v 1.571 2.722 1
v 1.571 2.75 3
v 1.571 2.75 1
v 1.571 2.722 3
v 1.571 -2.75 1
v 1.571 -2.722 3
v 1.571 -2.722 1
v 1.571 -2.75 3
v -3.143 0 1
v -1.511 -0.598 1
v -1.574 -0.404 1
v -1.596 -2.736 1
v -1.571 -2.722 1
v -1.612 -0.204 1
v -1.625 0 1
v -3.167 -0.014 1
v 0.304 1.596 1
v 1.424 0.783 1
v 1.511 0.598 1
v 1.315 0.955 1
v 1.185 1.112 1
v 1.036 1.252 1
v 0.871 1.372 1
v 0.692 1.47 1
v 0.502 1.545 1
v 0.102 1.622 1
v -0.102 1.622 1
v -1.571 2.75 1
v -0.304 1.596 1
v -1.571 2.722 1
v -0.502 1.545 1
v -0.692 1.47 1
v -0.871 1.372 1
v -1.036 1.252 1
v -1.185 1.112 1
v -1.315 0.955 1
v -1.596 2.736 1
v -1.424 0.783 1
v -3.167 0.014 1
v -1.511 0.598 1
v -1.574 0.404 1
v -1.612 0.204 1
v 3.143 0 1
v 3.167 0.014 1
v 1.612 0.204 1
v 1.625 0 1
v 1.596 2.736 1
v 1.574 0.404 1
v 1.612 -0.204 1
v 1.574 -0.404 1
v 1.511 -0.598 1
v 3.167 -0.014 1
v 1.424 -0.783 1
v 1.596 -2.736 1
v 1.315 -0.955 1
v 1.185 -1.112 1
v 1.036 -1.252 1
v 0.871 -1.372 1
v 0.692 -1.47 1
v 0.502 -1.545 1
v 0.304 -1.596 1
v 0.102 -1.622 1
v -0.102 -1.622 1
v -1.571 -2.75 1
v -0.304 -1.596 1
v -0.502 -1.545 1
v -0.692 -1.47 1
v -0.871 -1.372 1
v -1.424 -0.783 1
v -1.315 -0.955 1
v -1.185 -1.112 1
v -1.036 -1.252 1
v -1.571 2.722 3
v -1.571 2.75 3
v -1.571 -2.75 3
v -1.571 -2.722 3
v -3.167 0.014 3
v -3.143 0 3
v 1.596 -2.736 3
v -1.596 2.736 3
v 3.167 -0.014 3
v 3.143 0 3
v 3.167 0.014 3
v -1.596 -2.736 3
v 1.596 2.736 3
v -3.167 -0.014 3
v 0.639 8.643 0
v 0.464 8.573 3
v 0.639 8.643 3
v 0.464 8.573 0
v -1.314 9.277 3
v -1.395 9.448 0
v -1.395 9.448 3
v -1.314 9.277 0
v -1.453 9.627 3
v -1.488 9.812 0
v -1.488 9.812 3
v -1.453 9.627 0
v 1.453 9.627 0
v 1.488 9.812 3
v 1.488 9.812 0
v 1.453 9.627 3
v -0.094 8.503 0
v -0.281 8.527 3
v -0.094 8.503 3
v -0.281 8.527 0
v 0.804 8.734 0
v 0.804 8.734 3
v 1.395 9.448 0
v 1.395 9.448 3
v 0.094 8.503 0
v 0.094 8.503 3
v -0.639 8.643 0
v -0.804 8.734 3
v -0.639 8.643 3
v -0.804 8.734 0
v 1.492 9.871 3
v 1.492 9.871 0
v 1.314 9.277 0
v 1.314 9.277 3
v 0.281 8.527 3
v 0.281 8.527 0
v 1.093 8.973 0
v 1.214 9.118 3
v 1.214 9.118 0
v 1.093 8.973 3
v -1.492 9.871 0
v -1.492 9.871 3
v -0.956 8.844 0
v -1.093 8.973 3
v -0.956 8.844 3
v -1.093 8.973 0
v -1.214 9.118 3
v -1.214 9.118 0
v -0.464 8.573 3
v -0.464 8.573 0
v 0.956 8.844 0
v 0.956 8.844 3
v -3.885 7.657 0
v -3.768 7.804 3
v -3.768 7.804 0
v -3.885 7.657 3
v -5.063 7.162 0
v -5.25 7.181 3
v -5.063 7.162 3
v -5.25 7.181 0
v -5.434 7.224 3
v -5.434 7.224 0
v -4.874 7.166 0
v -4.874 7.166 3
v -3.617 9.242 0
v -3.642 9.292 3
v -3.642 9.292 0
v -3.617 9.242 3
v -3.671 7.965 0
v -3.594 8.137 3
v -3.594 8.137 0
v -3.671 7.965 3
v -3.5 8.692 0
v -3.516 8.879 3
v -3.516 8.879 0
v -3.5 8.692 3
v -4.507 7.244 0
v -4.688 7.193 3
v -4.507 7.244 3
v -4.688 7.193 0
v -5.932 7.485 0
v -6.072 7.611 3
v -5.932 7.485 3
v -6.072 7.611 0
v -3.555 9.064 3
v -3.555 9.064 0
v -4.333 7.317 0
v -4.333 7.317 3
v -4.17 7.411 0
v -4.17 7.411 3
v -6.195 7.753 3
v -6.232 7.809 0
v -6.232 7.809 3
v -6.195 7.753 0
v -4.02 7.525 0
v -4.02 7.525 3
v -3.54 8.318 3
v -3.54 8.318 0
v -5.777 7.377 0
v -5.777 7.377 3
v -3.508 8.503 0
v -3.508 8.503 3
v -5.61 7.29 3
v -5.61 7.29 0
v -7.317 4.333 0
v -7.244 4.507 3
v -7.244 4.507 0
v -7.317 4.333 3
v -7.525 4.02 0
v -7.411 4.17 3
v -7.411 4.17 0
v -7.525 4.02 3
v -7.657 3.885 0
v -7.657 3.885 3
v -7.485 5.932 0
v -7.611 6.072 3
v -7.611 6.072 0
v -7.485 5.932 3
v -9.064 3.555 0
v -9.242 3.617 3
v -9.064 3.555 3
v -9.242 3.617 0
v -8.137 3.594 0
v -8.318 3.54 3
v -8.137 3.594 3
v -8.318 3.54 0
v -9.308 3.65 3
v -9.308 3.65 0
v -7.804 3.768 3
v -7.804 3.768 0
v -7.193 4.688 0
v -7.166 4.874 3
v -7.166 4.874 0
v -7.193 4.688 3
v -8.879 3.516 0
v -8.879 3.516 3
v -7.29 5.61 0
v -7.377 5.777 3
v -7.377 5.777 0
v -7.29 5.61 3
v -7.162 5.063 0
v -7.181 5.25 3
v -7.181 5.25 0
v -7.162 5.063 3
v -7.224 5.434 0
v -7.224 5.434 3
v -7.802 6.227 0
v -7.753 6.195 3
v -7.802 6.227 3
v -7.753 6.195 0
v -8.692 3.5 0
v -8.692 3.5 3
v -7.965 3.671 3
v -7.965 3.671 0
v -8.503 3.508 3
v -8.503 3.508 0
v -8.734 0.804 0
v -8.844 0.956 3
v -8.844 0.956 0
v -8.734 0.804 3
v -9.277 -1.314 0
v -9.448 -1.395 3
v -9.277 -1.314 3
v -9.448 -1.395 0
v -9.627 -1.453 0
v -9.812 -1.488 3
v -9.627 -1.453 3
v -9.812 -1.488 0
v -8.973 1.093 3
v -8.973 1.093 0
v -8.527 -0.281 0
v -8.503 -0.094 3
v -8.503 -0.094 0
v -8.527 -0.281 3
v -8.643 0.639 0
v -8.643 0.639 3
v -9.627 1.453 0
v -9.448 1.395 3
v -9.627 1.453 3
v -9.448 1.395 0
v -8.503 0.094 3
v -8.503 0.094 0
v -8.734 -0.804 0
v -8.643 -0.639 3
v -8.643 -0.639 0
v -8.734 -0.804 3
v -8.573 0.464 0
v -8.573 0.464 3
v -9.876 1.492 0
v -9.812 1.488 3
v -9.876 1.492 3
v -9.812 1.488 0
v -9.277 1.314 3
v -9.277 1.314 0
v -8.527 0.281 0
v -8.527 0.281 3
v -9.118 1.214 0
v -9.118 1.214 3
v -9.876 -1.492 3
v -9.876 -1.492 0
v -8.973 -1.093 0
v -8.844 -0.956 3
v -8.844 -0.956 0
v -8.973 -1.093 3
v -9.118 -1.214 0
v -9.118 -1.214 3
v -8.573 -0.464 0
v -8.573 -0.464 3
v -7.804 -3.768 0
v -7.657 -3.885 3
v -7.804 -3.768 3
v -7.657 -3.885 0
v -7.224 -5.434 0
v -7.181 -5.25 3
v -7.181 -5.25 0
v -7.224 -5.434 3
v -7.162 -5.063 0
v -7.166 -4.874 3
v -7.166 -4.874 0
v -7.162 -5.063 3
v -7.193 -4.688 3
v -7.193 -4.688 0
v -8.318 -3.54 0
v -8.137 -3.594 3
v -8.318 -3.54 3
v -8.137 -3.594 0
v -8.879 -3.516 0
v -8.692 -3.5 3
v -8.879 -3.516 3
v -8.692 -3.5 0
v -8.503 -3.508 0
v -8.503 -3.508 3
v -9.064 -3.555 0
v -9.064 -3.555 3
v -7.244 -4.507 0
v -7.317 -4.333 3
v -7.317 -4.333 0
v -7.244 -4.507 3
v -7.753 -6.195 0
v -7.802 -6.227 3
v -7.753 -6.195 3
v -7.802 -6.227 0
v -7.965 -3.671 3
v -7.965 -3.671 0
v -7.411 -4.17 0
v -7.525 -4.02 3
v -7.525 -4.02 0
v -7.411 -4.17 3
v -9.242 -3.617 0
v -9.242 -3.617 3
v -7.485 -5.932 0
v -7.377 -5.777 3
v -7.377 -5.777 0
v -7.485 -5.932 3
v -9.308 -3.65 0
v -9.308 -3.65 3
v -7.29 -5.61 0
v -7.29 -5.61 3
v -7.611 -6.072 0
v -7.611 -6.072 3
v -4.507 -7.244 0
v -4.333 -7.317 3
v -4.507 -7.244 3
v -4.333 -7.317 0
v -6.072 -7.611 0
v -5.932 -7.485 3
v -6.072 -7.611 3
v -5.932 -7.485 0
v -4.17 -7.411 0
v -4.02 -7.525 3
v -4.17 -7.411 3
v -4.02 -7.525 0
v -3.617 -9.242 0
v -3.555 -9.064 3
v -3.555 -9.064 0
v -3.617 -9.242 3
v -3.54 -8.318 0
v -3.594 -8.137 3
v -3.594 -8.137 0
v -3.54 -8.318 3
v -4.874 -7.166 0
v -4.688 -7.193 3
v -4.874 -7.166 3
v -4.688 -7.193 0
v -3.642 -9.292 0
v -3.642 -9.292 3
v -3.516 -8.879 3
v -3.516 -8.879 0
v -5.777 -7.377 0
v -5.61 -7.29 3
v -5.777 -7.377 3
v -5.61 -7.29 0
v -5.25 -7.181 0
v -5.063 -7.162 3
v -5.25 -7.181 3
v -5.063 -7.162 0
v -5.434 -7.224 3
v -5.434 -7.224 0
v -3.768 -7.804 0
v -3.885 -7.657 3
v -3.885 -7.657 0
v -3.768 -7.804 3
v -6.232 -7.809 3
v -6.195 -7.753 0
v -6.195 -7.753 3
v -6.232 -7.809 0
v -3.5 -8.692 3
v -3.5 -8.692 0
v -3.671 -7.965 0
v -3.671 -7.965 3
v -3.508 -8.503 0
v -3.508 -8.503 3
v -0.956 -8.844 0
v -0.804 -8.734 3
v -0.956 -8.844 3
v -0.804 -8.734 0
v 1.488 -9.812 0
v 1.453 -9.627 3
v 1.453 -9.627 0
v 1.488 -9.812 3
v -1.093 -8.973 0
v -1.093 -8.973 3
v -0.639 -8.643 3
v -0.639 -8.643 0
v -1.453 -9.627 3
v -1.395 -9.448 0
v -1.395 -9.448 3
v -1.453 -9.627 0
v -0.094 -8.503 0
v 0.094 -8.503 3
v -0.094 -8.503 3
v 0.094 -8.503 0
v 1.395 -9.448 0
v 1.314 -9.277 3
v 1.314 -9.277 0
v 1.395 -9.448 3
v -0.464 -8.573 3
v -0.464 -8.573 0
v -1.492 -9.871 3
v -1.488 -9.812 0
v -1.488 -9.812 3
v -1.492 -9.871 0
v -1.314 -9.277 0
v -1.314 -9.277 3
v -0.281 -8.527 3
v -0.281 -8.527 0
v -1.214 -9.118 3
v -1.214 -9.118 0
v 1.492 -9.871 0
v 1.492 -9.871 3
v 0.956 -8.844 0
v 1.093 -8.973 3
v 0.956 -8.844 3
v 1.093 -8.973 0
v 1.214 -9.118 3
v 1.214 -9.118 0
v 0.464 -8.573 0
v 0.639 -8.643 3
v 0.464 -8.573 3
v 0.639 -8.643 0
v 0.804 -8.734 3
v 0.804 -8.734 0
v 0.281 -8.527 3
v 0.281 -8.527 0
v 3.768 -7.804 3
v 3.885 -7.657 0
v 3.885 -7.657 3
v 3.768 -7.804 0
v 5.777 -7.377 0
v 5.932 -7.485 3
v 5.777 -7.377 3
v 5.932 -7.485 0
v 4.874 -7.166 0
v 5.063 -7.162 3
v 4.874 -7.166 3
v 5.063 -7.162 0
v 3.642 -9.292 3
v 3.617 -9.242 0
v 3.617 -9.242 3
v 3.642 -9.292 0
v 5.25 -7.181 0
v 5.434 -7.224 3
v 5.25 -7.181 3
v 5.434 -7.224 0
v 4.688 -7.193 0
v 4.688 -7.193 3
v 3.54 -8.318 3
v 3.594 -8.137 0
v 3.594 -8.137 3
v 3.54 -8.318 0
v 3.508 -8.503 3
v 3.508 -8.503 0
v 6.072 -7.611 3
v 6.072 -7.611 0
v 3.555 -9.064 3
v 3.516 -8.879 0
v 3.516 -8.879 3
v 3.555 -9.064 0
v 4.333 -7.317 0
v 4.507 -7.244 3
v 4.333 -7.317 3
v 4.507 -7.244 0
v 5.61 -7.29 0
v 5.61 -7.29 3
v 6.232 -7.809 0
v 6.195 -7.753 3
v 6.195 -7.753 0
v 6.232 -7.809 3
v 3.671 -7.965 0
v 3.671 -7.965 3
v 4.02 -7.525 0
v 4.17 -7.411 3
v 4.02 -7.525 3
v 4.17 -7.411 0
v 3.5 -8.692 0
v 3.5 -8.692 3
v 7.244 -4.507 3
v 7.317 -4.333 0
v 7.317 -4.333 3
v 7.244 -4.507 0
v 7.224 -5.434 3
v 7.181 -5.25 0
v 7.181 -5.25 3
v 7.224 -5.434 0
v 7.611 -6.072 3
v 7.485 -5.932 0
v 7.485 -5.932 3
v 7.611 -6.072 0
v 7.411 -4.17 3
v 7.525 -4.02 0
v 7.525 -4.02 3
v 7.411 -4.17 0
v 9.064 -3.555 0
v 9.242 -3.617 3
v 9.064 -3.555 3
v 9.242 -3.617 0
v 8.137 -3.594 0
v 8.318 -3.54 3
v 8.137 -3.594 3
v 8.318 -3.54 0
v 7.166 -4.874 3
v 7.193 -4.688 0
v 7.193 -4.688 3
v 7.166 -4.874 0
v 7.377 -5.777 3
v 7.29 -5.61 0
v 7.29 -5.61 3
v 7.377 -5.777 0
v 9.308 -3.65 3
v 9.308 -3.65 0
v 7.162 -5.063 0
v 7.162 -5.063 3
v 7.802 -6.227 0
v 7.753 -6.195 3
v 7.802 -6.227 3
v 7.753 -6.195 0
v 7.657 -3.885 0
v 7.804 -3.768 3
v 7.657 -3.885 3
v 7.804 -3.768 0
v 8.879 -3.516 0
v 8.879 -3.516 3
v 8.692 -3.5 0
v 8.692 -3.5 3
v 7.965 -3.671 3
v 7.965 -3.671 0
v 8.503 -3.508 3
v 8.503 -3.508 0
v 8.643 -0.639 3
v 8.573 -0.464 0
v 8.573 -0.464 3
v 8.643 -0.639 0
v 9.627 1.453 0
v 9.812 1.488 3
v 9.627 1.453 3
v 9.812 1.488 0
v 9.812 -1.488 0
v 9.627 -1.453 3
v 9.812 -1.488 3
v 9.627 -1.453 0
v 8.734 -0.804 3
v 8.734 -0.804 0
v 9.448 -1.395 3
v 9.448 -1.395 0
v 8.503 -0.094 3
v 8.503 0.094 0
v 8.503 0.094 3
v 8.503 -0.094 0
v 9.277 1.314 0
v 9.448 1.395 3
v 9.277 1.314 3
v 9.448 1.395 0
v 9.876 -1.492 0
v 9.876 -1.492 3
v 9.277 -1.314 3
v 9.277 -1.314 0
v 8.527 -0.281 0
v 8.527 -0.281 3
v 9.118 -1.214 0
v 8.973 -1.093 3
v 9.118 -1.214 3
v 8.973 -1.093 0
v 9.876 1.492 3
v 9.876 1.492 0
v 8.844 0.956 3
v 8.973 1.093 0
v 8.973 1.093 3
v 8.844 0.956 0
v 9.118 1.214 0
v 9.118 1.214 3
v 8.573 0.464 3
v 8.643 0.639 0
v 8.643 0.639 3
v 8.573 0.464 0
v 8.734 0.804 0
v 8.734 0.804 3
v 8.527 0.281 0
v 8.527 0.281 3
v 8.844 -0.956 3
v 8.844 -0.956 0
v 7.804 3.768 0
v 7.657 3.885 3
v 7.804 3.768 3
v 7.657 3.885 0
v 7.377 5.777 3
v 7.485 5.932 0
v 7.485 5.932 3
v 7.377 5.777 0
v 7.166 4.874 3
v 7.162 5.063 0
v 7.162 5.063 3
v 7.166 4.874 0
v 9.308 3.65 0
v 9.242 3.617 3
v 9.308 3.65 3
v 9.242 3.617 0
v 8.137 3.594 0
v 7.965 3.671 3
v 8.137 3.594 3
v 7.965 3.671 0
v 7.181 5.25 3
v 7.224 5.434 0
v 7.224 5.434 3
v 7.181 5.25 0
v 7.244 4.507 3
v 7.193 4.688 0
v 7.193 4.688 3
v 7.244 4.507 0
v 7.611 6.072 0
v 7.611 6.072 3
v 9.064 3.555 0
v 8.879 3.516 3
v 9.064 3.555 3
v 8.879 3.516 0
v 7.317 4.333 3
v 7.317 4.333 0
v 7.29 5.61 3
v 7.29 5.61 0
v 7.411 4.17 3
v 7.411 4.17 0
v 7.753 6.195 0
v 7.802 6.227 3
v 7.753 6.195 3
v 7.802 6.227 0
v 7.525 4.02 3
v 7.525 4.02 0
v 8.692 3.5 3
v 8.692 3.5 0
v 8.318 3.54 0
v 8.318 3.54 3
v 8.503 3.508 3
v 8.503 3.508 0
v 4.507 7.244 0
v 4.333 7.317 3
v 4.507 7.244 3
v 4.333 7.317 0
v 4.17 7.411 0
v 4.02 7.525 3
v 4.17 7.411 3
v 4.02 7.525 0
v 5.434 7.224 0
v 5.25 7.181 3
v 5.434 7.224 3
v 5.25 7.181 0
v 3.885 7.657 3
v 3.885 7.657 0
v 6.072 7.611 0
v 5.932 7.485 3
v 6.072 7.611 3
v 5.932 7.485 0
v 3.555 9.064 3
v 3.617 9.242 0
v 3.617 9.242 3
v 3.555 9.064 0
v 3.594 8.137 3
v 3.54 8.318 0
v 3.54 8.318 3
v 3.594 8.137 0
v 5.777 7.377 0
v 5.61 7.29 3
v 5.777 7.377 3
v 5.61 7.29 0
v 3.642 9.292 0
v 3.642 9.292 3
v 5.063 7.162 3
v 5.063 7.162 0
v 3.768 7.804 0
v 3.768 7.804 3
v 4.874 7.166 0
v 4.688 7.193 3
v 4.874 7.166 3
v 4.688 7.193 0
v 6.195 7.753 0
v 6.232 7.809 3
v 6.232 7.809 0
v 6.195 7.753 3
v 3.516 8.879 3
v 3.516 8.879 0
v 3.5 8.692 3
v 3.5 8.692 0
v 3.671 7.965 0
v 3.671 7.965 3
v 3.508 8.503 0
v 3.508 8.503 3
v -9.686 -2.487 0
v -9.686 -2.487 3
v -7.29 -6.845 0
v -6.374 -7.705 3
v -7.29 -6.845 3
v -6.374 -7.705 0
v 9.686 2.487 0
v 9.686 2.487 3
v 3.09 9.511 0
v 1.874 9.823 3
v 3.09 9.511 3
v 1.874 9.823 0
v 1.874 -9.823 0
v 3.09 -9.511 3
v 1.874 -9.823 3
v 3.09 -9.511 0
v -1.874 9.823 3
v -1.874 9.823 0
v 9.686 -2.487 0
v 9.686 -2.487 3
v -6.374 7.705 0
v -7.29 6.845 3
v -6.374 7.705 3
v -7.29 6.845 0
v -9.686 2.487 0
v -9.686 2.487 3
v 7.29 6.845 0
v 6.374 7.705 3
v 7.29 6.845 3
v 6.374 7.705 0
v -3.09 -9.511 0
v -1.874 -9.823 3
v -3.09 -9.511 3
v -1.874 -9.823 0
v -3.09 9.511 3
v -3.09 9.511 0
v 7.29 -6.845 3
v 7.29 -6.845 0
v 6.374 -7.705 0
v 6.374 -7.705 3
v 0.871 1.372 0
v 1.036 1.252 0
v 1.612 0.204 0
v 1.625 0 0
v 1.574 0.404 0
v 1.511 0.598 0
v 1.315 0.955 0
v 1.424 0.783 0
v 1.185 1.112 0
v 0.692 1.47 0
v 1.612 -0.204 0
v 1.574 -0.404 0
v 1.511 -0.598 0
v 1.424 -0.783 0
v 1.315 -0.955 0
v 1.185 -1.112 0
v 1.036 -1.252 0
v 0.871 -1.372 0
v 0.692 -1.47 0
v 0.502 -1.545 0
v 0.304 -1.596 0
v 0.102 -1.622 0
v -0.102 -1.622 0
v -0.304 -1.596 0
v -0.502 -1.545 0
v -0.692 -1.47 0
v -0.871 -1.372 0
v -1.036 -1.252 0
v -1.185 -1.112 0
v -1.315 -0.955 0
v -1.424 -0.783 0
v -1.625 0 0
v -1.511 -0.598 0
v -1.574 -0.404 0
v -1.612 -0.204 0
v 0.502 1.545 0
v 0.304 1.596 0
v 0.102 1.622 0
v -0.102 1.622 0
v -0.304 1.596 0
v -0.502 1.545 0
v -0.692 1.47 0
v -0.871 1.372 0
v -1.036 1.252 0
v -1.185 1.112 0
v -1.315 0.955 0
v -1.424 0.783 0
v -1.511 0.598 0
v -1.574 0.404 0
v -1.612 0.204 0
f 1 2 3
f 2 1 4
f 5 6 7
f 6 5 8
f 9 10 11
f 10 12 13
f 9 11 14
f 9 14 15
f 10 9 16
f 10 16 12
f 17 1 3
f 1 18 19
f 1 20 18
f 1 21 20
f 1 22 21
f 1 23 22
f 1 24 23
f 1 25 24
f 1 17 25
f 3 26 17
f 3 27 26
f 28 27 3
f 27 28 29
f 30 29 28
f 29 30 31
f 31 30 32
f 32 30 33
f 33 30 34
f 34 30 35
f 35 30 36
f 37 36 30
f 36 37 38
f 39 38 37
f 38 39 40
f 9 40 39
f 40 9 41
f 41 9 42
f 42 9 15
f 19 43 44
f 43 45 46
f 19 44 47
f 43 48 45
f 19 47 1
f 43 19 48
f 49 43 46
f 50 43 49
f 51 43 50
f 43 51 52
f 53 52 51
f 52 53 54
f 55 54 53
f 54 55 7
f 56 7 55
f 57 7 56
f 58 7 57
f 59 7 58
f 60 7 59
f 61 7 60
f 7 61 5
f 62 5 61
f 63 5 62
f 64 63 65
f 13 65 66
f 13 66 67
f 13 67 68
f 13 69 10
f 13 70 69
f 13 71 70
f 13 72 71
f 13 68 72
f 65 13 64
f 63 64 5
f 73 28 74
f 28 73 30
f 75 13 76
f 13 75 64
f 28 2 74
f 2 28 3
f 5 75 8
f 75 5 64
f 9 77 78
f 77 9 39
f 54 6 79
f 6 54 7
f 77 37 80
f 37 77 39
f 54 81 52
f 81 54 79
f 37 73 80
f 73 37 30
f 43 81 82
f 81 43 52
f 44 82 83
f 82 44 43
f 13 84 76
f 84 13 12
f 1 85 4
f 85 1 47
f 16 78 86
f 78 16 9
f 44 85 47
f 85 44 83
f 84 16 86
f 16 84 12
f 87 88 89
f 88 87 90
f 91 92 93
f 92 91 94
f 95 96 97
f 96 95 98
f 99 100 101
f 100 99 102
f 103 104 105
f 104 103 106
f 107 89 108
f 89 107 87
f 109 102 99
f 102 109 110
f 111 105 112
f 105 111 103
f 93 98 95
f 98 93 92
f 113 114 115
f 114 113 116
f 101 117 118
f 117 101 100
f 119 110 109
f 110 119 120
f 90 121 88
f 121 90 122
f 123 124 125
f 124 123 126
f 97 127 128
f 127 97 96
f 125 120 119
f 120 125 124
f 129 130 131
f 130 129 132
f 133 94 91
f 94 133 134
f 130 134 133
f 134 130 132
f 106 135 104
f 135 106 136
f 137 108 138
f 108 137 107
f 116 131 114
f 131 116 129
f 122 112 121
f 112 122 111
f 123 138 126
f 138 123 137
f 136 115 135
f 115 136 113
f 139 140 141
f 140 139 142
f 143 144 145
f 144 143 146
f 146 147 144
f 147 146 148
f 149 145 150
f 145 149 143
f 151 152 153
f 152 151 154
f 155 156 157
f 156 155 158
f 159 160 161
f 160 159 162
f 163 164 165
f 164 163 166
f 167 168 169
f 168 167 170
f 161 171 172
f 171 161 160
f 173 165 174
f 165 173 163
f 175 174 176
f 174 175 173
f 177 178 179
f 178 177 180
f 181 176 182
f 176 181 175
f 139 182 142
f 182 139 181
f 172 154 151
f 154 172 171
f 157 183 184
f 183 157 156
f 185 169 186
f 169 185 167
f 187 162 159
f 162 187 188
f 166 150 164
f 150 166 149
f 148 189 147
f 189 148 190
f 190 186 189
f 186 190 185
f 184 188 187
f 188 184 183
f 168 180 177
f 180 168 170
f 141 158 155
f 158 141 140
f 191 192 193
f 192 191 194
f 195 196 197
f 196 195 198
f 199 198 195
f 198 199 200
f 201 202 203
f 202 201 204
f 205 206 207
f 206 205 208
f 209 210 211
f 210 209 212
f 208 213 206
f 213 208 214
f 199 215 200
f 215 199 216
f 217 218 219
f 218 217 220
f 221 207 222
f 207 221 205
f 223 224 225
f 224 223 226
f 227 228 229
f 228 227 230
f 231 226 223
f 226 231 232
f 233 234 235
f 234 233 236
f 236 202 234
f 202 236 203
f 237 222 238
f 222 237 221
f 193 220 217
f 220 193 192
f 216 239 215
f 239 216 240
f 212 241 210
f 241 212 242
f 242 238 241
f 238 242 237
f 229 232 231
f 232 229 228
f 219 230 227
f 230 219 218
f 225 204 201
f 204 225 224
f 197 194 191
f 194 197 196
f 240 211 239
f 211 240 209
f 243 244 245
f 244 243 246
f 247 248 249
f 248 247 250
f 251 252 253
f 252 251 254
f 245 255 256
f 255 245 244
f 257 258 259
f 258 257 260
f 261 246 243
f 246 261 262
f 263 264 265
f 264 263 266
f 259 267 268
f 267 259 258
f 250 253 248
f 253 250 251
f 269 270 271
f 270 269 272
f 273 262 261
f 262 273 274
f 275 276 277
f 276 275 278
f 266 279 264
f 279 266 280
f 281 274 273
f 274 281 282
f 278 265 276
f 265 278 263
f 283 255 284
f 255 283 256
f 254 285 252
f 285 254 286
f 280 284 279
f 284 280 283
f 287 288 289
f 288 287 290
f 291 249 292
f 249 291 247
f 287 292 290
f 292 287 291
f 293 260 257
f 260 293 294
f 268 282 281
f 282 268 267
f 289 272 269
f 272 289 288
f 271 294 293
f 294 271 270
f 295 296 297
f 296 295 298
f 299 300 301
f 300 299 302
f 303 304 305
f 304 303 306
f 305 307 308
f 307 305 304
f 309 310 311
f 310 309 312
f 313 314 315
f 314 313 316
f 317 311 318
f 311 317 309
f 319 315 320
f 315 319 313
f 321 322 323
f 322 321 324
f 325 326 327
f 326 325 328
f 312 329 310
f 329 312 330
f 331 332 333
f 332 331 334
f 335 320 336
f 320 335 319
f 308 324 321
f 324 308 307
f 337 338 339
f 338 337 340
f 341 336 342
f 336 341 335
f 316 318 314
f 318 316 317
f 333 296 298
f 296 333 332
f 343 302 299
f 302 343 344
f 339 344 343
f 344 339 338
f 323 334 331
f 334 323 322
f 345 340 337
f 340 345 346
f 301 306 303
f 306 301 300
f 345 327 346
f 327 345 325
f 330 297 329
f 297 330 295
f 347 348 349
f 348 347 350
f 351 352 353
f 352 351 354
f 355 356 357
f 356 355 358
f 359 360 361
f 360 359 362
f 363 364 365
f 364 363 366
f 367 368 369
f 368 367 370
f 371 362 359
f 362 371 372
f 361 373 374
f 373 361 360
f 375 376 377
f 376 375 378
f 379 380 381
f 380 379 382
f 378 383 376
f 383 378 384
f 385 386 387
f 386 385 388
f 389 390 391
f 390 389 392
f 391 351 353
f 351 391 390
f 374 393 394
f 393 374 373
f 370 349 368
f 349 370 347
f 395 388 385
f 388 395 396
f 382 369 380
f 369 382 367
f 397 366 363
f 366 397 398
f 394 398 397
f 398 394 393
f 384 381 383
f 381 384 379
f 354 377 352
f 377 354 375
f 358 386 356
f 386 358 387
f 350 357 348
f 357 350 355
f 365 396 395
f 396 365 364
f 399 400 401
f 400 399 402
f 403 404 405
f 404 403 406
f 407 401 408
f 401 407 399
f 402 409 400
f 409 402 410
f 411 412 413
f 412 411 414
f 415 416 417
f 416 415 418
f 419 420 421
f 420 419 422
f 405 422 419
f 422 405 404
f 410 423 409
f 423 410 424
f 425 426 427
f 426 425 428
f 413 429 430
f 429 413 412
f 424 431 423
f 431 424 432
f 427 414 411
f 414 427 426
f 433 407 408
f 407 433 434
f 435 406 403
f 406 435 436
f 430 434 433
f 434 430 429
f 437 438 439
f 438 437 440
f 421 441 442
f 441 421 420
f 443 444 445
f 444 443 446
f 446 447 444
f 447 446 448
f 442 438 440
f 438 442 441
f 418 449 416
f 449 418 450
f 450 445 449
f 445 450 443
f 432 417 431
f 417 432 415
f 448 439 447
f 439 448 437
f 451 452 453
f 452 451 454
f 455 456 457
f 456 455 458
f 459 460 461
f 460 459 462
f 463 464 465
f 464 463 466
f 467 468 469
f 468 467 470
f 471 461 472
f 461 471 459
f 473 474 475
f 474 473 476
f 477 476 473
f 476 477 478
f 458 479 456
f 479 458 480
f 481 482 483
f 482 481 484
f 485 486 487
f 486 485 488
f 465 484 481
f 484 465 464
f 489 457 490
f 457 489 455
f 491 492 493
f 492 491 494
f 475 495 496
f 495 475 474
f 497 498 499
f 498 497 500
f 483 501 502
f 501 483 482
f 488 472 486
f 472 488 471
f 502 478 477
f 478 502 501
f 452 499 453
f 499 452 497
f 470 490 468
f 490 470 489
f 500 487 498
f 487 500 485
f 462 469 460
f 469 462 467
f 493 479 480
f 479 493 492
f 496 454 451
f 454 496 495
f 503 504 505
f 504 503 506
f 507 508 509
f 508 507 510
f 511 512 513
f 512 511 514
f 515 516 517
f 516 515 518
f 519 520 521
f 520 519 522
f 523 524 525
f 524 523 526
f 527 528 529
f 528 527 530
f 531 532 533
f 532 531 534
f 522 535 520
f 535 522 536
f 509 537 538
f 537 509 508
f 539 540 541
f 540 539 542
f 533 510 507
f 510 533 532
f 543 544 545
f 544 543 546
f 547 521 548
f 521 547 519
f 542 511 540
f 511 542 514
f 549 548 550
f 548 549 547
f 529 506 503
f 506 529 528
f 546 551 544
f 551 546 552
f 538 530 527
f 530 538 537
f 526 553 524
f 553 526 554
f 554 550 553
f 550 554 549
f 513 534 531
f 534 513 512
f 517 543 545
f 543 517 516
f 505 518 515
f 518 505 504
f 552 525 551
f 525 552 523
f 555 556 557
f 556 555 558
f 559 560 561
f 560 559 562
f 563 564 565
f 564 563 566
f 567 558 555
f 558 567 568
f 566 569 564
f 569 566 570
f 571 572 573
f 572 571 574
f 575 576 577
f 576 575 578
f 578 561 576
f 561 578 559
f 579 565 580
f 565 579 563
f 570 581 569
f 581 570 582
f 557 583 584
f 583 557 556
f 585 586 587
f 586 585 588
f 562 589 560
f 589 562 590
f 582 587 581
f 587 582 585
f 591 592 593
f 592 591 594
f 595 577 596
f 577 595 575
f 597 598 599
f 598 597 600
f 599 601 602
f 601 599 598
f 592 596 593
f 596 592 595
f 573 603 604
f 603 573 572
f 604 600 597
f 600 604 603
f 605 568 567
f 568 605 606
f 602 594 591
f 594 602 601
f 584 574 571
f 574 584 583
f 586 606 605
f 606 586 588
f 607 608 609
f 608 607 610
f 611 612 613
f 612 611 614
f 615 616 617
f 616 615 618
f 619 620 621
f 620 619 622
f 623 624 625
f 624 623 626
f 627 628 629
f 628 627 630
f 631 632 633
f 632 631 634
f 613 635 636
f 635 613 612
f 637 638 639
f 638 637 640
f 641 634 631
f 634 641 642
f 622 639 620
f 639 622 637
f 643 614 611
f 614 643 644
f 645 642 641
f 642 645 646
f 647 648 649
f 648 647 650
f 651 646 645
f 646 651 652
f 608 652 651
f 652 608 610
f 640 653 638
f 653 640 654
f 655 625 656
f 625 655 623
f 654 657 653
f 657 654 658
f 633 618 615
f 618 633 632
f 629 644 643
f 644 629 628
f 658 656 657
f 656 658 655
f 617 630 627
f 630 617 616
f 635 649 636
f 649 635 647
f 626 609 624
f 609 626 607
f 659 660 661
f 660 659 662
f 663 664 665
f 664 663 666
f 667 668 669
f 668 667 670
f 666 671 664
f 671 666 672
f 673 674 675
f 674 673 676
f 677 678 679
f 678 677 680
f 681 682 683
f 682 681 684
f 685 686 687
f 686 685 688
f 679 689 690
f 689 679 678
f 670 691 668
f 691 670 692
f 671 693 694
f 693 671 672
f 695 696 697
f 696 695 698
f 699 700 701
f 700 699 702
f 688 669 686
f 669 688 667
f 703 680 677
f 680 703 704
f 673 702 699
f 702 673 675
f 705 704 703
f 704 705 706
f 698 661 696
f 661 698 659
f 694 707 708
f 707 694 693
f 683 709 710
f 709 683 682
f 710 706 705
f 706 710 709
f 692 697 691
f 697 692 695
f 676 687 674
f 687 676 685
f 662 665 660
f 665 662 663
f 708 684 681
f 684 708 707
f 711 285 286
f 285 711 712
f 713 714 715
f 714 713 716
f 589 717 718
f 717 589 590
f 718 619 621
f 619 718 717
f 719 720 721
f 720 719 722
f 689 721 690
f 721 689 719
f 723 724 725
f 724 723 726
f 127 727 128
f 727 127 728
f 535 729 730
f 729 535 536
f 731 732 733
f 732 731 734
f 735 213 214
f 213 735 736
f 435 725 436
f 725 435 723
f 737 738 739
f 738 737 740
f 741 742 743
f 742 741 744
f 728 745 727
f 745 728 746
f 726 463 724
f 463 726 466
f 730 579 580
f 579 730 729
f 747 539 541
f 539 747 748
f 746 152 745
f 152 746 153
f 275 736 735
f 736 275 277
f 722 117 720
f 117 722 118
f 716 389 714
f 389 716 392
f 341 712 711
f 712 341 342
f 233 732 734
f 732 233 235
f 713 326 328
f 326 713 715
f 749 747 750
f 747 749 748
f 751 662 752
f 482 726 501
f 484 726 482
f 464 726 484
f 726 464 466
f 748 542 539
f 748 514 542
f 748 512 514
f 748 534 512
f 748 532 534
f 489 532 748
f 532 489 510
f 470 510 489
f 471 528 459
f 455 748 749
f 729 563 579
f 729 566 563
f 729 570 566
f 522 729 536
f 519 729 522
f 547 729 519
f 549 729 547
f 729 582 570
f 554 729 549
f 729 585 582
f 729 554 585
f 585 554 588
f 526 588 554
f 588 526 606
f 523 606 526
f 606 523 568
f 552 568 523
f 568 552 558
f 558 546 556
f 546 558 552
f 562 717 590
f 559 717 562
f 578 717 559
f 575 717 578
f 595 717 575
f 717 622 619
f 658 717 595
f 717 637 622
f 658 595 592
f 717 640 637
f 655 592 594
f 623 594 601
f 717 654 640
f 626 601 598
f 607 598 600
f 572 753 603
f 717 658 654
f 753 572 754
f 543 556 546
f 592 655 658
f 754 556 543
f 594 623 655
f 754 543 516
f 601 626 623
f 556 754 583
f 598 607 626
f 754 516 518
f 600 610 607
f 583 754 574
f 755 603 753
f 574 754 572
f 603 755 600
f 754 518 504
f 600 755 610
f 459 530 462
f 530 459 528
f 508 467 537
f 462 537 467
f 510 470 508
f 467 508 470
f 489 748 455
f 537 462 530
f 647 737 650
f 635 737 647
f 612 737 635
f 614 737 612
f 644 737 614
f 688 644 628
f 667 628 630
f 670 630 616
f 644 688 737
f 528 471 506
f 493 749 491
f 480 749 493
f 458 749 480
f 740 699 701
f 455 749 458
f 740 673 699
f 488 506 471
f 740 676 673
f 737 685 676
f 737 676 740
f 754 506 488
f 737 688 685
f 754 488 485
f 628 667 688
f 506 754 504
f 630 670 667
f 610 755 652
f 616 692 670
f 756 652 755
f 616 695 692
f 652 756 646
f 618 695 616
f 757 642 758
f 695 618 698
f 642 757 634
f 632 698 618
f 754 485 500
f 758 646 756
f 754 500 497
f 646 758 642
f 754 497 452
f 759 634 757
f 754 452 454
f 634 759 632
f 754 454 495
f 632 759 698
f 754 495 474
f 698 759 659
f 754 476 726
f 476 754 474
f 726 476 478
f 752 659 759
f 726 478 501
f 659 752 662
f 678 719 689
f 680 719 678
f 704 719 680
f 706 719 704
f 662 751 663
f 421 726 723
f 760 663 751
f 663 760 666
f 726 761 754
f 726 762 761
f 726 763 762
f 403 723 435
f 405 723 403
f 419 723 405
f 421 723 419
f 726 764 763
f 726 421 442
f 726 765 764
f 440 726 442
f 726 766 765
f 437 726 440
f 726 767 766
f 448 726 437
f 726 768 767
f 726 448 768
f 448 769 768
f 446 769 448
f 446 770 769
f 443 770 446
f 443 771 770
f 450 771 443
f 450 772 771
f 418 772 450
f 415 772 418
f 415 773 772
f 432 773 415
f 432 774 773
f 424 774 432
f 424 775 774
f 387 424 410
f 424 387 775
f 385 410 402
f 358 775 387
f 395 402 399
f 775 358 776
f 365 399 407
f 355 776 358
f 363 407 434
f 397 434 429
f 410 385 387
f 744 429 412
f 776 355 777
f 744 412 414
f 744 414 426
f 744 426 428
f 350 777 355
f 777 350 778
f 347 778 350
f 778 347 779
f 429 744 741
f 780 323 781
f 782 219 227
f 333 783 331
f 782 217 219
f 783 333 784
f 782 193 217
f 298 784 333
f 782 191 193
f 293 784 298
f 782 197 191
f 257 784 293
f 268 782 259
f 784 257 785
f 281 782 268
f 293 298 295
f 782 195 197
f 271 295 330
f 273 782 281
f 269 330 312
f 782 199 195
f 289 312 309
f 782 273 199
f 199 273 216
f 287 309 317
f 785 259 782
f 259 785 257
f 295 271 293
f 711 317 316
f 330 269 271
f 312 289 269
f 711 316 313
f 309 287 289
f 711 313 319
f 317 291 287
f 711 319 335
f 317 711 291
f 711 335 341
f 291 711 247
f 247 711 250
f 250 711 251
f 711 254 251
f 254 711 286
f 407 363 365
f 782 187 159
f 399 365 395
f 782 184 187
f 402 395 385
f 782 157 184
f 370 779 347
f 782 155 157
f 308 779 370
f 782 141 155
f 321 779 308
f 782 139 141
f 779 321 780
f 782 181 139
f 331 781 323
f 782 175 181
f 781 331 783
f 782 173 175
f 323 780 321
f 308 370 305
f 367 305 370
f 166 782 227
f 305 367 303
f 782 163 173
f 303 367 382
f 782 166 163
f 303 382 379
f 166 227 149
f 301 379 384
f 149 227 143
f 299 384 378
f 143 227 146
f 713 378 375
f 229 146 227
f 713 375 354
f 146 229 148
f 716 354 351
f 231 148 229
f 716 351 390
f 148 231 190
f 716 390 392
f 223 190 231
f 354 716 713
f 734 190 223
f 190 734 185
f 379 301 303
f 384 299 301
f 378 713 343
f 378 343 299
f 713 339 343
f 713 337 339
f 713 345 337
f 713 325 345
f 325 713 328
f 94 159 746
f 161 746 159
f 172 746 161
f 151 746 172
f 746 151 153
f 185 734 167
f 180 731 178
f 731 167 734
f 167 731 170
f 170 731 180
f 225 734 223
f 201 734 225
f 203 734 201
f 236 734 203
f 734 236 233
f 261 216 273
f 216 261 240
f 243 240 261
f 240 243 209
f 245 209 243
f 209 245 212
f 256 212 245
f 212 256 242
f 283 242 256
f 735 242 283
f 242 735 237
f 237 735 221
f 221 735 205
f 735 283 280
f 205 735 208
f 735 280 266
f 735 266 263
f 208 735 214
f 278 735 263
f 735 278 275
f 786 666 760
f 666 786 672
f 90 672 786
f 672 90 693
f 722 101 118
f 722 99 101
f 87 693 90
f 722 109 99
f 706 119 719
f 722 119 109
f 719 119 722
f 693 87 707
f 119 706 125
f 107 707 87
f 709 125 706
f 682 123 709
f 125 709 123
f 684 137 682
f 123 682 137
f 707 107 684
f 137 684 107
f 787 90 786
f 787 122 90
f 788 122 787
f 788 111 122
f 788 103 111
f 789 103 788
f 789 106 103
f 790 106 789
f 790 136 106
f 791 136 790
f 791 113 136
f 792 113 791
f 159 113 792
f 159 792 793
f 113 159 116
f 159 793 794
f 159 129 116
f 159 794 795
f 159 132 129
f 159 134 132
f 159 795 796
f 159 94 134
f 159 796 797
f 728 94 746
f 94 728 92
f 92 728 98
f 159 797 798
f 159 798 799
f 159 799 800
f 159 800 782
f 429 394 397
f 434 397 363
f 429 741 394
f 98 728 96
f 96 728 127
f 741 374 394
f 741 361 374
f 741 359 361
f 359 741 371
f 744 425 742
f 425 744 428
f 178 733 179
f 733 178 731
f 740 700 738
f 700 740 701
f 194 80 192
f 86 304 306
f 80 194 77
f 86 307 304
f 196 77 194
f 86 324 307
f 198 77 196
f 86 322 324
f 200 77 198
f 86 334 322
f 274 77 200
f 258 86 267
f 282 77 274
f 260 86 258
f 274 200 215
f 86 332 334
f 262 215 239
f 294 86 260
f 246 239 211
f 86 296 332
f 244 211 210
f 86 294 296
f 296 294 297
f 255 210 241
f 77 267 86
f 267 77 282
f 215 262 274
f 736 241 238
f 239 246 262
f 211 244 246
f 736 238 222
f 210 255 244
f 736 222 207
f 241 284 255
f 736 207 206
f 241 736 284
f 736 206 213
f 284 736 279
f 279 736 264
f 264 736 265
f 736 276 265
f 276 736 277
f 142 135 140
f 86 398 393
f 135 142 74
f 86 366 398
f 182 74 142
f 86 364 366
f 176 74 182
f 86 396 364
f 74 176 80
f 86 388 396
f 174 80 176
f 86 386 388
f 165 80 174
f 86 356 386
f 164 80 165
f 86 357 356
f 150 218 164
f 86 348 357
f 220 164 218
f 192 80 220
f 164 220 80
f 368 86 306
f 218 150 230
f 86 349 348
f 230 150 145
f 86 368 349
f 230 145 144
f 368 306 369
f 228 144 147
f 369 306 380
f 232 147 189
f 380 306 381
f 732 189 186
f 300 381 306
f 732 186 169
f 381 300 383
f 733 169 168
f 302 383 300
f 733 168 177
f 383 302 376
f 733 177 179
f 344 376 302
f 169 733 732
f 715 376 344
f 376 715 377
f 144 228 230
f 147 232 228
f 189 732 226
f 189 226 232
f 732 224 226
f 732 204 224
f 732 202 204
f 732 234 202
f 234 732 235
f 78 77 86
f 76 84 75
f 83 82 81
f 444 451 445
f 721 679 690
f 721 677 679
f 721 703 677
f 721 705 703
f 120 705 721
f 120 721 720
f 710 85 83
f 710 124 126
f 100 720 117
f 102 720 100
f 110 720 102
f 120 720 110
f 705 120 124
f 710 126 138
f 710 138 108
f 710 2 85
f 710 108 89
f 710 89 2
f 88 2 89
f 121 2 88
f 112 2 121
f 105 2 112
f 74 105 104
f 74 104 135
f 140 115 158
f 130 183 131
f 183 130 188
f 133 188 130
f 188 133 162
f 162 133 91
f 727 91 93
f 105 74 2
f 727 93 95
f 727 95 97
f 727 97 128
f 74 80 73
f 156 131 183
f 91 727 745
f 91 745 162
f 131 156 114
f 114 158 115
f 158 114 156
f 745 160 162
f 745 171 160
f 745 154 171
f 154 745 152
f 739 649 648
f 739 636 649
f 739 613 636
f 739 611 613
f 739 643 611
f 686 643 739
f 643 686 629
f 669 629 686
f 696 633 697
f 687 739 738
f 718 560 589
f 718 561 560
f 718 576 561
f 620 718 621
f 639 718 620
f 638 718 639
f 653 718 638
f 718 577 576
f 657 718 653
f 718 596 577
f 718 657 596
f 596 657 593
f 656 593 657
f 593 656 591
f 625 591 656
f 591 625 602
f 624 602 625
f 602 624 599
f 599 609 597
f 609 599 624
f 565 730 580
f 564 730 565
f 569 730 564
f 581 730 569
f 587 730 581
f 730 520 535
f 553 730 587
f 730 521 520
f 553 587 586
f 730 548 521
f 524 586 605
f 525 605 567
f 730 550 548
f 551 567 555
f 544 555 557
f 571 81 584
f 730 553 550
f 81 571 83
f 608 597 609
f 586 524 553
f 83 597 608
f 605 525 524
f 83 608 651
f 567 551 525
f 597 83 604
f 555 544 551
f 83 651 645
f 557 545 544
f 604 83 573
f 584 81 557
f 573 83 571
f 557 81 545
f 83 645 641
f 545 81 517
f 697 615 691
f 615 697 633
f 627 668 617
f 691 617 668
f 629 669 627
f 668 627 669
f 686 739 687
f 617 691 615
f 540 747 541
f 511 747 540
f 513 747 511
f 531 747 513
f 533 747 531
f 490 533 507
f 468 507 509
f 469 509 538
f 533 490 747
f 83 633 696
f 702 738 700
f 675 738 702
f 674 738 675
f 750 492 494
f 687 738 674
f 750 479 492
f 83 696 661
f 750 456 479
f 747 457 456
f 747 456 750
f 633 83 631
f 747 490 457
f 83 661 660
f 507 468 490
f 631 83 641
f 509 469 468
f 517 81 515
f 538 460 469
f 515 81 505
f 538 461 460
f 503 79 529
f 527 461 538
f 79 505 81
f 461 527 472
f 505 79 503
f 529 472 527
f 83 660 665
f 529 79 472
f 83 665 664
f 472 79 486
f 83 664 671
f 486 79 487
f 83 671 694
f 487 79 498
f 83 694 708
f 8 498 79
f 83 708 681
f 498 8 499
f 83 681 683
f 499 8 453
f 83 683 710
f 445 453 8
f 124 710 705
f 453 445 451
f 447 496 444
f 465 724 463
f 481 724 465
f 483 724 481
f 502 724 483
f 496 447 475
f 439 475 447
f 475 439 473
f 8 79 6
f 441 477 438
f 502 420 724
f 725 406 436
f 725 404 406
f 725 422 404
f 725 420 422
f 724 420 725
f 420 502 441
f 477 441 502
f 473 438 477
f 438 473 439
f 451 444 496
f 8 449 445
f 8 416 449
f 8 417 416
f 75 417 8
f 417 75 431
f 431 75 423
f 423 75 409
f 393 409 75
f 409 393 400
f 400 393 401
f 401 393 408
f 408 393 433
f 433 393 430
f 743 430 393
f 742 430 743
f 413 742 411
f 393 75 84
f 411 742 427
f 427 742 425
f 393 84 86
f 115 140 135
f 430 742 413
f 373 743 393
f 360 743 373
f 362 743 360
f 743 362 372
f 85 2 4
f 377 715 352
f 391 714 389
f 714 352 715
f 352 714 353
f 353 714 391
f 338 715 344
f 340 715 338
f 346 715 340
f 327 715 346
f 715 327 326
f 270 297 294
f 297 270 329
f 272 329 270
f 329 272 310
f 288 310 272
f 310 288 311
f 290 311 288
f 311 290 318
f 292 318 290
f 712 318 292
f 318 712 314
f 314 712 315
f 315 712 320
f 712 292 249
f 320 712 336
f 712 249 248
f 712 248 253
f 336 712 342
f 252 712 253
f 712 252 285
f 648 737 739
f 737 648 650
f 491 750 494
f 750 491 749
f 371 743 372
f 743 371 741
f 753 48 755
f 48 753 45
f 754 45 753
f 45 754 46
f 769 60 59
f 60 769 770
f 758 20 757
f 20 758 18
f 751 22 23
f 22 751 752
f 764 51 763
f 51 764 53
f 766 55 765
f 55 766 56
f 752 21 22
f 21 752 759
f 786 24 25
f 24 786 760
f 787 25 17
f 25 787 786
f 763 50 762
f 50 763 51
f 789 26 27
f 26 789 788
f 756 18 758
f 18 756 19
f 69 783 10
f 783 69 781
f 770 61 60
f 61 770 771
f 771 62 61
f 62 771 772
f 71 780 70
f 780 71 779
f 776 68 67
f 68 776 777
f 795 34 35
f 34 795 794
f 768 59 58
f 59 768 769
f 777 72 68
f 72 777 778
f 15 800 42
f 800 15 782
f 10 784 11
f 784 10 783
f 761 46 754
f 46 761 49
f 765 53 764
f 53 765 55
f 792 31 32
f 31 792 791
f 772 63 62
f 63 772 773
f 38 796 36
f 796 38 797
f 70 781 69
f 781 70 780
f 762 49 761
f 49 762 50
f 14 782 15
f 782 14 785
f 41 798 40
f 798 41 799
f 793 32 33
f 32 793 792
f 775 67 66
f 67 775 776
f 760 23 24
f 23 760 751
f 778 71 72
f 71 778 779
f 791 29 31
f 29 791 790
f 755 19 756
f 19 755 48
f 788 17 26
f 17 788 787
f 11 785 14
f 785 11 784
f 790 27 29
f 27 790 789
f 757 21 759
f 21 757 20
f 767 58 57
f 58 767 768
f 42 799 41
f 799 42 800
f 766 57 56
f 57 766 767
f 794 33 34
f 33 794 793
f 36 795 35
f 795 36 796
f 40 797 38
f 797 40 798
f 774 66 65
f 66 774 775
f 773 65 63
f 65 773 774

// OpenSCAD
// ******************************
// *   Parametric thumb wheel   *
// *   by Chris Garrett         *
// *   20-nov-2011              *
// ******************************


// *** Configuration variables ***
wheel_d = 20;    // Outer Diameter of the thumb wheel
wheel_h = 3;     // Height of the thumb wheel
hole_d = 3.25;    // Diameter of center hole
hex_sz = 5.5;      // Size of the hex (nut trap)
                 // An M4 nut fits perfectly in a 7mm hex opening made on my Prusa
hex_d = 2;       // Depth of the hex (set this < or = to wheel_h)
knurl_cnt = 12;  // Number of cutouts around the wheel
knurl_d = 3;     // Diameter of the cutouts


// *** Code area ***

module box(w,h,d) {
 translate([0,0,d/2]) scale ([w,h,d]) cube(1, true);
}

module hexagon(height, depth) {
 boxWidth=height/1.75;
 union() {
  box(boxWidth, height, depth);
  rotate([0,0,60]) box(boxWidth, height, depth);
  rotate([0,0,-60]) box(boxWidth, height, depth);
 }
}


// The thumb wheel 

difference() {
 cylinder(h=wheel_h, r=wheel_d/2, $fn=50);
 translate([0,0,-1]) cylinder(h=wheel_h+2, r=hole_d/2, $fn=50);
 if (hex_d >= wheel_h) {
   translate([0,0,-1]) hexagon(height=hex_sz, depth=wheel_d+2);
 } else {
  translate([0,0,wheel_h-hex_d]) hexagon(height=hex_sz, depth=hex_d+1);
 }
 for(i = [0:knurl_cnt-1]) {
  rotate(v=[0,0,1], a=i*360/knurl_cnt) translate([0,wheel_d/2,-1]) cylinder(h=wheel_h+2, r=knurl_d/2, $fn=50);
 }
}
